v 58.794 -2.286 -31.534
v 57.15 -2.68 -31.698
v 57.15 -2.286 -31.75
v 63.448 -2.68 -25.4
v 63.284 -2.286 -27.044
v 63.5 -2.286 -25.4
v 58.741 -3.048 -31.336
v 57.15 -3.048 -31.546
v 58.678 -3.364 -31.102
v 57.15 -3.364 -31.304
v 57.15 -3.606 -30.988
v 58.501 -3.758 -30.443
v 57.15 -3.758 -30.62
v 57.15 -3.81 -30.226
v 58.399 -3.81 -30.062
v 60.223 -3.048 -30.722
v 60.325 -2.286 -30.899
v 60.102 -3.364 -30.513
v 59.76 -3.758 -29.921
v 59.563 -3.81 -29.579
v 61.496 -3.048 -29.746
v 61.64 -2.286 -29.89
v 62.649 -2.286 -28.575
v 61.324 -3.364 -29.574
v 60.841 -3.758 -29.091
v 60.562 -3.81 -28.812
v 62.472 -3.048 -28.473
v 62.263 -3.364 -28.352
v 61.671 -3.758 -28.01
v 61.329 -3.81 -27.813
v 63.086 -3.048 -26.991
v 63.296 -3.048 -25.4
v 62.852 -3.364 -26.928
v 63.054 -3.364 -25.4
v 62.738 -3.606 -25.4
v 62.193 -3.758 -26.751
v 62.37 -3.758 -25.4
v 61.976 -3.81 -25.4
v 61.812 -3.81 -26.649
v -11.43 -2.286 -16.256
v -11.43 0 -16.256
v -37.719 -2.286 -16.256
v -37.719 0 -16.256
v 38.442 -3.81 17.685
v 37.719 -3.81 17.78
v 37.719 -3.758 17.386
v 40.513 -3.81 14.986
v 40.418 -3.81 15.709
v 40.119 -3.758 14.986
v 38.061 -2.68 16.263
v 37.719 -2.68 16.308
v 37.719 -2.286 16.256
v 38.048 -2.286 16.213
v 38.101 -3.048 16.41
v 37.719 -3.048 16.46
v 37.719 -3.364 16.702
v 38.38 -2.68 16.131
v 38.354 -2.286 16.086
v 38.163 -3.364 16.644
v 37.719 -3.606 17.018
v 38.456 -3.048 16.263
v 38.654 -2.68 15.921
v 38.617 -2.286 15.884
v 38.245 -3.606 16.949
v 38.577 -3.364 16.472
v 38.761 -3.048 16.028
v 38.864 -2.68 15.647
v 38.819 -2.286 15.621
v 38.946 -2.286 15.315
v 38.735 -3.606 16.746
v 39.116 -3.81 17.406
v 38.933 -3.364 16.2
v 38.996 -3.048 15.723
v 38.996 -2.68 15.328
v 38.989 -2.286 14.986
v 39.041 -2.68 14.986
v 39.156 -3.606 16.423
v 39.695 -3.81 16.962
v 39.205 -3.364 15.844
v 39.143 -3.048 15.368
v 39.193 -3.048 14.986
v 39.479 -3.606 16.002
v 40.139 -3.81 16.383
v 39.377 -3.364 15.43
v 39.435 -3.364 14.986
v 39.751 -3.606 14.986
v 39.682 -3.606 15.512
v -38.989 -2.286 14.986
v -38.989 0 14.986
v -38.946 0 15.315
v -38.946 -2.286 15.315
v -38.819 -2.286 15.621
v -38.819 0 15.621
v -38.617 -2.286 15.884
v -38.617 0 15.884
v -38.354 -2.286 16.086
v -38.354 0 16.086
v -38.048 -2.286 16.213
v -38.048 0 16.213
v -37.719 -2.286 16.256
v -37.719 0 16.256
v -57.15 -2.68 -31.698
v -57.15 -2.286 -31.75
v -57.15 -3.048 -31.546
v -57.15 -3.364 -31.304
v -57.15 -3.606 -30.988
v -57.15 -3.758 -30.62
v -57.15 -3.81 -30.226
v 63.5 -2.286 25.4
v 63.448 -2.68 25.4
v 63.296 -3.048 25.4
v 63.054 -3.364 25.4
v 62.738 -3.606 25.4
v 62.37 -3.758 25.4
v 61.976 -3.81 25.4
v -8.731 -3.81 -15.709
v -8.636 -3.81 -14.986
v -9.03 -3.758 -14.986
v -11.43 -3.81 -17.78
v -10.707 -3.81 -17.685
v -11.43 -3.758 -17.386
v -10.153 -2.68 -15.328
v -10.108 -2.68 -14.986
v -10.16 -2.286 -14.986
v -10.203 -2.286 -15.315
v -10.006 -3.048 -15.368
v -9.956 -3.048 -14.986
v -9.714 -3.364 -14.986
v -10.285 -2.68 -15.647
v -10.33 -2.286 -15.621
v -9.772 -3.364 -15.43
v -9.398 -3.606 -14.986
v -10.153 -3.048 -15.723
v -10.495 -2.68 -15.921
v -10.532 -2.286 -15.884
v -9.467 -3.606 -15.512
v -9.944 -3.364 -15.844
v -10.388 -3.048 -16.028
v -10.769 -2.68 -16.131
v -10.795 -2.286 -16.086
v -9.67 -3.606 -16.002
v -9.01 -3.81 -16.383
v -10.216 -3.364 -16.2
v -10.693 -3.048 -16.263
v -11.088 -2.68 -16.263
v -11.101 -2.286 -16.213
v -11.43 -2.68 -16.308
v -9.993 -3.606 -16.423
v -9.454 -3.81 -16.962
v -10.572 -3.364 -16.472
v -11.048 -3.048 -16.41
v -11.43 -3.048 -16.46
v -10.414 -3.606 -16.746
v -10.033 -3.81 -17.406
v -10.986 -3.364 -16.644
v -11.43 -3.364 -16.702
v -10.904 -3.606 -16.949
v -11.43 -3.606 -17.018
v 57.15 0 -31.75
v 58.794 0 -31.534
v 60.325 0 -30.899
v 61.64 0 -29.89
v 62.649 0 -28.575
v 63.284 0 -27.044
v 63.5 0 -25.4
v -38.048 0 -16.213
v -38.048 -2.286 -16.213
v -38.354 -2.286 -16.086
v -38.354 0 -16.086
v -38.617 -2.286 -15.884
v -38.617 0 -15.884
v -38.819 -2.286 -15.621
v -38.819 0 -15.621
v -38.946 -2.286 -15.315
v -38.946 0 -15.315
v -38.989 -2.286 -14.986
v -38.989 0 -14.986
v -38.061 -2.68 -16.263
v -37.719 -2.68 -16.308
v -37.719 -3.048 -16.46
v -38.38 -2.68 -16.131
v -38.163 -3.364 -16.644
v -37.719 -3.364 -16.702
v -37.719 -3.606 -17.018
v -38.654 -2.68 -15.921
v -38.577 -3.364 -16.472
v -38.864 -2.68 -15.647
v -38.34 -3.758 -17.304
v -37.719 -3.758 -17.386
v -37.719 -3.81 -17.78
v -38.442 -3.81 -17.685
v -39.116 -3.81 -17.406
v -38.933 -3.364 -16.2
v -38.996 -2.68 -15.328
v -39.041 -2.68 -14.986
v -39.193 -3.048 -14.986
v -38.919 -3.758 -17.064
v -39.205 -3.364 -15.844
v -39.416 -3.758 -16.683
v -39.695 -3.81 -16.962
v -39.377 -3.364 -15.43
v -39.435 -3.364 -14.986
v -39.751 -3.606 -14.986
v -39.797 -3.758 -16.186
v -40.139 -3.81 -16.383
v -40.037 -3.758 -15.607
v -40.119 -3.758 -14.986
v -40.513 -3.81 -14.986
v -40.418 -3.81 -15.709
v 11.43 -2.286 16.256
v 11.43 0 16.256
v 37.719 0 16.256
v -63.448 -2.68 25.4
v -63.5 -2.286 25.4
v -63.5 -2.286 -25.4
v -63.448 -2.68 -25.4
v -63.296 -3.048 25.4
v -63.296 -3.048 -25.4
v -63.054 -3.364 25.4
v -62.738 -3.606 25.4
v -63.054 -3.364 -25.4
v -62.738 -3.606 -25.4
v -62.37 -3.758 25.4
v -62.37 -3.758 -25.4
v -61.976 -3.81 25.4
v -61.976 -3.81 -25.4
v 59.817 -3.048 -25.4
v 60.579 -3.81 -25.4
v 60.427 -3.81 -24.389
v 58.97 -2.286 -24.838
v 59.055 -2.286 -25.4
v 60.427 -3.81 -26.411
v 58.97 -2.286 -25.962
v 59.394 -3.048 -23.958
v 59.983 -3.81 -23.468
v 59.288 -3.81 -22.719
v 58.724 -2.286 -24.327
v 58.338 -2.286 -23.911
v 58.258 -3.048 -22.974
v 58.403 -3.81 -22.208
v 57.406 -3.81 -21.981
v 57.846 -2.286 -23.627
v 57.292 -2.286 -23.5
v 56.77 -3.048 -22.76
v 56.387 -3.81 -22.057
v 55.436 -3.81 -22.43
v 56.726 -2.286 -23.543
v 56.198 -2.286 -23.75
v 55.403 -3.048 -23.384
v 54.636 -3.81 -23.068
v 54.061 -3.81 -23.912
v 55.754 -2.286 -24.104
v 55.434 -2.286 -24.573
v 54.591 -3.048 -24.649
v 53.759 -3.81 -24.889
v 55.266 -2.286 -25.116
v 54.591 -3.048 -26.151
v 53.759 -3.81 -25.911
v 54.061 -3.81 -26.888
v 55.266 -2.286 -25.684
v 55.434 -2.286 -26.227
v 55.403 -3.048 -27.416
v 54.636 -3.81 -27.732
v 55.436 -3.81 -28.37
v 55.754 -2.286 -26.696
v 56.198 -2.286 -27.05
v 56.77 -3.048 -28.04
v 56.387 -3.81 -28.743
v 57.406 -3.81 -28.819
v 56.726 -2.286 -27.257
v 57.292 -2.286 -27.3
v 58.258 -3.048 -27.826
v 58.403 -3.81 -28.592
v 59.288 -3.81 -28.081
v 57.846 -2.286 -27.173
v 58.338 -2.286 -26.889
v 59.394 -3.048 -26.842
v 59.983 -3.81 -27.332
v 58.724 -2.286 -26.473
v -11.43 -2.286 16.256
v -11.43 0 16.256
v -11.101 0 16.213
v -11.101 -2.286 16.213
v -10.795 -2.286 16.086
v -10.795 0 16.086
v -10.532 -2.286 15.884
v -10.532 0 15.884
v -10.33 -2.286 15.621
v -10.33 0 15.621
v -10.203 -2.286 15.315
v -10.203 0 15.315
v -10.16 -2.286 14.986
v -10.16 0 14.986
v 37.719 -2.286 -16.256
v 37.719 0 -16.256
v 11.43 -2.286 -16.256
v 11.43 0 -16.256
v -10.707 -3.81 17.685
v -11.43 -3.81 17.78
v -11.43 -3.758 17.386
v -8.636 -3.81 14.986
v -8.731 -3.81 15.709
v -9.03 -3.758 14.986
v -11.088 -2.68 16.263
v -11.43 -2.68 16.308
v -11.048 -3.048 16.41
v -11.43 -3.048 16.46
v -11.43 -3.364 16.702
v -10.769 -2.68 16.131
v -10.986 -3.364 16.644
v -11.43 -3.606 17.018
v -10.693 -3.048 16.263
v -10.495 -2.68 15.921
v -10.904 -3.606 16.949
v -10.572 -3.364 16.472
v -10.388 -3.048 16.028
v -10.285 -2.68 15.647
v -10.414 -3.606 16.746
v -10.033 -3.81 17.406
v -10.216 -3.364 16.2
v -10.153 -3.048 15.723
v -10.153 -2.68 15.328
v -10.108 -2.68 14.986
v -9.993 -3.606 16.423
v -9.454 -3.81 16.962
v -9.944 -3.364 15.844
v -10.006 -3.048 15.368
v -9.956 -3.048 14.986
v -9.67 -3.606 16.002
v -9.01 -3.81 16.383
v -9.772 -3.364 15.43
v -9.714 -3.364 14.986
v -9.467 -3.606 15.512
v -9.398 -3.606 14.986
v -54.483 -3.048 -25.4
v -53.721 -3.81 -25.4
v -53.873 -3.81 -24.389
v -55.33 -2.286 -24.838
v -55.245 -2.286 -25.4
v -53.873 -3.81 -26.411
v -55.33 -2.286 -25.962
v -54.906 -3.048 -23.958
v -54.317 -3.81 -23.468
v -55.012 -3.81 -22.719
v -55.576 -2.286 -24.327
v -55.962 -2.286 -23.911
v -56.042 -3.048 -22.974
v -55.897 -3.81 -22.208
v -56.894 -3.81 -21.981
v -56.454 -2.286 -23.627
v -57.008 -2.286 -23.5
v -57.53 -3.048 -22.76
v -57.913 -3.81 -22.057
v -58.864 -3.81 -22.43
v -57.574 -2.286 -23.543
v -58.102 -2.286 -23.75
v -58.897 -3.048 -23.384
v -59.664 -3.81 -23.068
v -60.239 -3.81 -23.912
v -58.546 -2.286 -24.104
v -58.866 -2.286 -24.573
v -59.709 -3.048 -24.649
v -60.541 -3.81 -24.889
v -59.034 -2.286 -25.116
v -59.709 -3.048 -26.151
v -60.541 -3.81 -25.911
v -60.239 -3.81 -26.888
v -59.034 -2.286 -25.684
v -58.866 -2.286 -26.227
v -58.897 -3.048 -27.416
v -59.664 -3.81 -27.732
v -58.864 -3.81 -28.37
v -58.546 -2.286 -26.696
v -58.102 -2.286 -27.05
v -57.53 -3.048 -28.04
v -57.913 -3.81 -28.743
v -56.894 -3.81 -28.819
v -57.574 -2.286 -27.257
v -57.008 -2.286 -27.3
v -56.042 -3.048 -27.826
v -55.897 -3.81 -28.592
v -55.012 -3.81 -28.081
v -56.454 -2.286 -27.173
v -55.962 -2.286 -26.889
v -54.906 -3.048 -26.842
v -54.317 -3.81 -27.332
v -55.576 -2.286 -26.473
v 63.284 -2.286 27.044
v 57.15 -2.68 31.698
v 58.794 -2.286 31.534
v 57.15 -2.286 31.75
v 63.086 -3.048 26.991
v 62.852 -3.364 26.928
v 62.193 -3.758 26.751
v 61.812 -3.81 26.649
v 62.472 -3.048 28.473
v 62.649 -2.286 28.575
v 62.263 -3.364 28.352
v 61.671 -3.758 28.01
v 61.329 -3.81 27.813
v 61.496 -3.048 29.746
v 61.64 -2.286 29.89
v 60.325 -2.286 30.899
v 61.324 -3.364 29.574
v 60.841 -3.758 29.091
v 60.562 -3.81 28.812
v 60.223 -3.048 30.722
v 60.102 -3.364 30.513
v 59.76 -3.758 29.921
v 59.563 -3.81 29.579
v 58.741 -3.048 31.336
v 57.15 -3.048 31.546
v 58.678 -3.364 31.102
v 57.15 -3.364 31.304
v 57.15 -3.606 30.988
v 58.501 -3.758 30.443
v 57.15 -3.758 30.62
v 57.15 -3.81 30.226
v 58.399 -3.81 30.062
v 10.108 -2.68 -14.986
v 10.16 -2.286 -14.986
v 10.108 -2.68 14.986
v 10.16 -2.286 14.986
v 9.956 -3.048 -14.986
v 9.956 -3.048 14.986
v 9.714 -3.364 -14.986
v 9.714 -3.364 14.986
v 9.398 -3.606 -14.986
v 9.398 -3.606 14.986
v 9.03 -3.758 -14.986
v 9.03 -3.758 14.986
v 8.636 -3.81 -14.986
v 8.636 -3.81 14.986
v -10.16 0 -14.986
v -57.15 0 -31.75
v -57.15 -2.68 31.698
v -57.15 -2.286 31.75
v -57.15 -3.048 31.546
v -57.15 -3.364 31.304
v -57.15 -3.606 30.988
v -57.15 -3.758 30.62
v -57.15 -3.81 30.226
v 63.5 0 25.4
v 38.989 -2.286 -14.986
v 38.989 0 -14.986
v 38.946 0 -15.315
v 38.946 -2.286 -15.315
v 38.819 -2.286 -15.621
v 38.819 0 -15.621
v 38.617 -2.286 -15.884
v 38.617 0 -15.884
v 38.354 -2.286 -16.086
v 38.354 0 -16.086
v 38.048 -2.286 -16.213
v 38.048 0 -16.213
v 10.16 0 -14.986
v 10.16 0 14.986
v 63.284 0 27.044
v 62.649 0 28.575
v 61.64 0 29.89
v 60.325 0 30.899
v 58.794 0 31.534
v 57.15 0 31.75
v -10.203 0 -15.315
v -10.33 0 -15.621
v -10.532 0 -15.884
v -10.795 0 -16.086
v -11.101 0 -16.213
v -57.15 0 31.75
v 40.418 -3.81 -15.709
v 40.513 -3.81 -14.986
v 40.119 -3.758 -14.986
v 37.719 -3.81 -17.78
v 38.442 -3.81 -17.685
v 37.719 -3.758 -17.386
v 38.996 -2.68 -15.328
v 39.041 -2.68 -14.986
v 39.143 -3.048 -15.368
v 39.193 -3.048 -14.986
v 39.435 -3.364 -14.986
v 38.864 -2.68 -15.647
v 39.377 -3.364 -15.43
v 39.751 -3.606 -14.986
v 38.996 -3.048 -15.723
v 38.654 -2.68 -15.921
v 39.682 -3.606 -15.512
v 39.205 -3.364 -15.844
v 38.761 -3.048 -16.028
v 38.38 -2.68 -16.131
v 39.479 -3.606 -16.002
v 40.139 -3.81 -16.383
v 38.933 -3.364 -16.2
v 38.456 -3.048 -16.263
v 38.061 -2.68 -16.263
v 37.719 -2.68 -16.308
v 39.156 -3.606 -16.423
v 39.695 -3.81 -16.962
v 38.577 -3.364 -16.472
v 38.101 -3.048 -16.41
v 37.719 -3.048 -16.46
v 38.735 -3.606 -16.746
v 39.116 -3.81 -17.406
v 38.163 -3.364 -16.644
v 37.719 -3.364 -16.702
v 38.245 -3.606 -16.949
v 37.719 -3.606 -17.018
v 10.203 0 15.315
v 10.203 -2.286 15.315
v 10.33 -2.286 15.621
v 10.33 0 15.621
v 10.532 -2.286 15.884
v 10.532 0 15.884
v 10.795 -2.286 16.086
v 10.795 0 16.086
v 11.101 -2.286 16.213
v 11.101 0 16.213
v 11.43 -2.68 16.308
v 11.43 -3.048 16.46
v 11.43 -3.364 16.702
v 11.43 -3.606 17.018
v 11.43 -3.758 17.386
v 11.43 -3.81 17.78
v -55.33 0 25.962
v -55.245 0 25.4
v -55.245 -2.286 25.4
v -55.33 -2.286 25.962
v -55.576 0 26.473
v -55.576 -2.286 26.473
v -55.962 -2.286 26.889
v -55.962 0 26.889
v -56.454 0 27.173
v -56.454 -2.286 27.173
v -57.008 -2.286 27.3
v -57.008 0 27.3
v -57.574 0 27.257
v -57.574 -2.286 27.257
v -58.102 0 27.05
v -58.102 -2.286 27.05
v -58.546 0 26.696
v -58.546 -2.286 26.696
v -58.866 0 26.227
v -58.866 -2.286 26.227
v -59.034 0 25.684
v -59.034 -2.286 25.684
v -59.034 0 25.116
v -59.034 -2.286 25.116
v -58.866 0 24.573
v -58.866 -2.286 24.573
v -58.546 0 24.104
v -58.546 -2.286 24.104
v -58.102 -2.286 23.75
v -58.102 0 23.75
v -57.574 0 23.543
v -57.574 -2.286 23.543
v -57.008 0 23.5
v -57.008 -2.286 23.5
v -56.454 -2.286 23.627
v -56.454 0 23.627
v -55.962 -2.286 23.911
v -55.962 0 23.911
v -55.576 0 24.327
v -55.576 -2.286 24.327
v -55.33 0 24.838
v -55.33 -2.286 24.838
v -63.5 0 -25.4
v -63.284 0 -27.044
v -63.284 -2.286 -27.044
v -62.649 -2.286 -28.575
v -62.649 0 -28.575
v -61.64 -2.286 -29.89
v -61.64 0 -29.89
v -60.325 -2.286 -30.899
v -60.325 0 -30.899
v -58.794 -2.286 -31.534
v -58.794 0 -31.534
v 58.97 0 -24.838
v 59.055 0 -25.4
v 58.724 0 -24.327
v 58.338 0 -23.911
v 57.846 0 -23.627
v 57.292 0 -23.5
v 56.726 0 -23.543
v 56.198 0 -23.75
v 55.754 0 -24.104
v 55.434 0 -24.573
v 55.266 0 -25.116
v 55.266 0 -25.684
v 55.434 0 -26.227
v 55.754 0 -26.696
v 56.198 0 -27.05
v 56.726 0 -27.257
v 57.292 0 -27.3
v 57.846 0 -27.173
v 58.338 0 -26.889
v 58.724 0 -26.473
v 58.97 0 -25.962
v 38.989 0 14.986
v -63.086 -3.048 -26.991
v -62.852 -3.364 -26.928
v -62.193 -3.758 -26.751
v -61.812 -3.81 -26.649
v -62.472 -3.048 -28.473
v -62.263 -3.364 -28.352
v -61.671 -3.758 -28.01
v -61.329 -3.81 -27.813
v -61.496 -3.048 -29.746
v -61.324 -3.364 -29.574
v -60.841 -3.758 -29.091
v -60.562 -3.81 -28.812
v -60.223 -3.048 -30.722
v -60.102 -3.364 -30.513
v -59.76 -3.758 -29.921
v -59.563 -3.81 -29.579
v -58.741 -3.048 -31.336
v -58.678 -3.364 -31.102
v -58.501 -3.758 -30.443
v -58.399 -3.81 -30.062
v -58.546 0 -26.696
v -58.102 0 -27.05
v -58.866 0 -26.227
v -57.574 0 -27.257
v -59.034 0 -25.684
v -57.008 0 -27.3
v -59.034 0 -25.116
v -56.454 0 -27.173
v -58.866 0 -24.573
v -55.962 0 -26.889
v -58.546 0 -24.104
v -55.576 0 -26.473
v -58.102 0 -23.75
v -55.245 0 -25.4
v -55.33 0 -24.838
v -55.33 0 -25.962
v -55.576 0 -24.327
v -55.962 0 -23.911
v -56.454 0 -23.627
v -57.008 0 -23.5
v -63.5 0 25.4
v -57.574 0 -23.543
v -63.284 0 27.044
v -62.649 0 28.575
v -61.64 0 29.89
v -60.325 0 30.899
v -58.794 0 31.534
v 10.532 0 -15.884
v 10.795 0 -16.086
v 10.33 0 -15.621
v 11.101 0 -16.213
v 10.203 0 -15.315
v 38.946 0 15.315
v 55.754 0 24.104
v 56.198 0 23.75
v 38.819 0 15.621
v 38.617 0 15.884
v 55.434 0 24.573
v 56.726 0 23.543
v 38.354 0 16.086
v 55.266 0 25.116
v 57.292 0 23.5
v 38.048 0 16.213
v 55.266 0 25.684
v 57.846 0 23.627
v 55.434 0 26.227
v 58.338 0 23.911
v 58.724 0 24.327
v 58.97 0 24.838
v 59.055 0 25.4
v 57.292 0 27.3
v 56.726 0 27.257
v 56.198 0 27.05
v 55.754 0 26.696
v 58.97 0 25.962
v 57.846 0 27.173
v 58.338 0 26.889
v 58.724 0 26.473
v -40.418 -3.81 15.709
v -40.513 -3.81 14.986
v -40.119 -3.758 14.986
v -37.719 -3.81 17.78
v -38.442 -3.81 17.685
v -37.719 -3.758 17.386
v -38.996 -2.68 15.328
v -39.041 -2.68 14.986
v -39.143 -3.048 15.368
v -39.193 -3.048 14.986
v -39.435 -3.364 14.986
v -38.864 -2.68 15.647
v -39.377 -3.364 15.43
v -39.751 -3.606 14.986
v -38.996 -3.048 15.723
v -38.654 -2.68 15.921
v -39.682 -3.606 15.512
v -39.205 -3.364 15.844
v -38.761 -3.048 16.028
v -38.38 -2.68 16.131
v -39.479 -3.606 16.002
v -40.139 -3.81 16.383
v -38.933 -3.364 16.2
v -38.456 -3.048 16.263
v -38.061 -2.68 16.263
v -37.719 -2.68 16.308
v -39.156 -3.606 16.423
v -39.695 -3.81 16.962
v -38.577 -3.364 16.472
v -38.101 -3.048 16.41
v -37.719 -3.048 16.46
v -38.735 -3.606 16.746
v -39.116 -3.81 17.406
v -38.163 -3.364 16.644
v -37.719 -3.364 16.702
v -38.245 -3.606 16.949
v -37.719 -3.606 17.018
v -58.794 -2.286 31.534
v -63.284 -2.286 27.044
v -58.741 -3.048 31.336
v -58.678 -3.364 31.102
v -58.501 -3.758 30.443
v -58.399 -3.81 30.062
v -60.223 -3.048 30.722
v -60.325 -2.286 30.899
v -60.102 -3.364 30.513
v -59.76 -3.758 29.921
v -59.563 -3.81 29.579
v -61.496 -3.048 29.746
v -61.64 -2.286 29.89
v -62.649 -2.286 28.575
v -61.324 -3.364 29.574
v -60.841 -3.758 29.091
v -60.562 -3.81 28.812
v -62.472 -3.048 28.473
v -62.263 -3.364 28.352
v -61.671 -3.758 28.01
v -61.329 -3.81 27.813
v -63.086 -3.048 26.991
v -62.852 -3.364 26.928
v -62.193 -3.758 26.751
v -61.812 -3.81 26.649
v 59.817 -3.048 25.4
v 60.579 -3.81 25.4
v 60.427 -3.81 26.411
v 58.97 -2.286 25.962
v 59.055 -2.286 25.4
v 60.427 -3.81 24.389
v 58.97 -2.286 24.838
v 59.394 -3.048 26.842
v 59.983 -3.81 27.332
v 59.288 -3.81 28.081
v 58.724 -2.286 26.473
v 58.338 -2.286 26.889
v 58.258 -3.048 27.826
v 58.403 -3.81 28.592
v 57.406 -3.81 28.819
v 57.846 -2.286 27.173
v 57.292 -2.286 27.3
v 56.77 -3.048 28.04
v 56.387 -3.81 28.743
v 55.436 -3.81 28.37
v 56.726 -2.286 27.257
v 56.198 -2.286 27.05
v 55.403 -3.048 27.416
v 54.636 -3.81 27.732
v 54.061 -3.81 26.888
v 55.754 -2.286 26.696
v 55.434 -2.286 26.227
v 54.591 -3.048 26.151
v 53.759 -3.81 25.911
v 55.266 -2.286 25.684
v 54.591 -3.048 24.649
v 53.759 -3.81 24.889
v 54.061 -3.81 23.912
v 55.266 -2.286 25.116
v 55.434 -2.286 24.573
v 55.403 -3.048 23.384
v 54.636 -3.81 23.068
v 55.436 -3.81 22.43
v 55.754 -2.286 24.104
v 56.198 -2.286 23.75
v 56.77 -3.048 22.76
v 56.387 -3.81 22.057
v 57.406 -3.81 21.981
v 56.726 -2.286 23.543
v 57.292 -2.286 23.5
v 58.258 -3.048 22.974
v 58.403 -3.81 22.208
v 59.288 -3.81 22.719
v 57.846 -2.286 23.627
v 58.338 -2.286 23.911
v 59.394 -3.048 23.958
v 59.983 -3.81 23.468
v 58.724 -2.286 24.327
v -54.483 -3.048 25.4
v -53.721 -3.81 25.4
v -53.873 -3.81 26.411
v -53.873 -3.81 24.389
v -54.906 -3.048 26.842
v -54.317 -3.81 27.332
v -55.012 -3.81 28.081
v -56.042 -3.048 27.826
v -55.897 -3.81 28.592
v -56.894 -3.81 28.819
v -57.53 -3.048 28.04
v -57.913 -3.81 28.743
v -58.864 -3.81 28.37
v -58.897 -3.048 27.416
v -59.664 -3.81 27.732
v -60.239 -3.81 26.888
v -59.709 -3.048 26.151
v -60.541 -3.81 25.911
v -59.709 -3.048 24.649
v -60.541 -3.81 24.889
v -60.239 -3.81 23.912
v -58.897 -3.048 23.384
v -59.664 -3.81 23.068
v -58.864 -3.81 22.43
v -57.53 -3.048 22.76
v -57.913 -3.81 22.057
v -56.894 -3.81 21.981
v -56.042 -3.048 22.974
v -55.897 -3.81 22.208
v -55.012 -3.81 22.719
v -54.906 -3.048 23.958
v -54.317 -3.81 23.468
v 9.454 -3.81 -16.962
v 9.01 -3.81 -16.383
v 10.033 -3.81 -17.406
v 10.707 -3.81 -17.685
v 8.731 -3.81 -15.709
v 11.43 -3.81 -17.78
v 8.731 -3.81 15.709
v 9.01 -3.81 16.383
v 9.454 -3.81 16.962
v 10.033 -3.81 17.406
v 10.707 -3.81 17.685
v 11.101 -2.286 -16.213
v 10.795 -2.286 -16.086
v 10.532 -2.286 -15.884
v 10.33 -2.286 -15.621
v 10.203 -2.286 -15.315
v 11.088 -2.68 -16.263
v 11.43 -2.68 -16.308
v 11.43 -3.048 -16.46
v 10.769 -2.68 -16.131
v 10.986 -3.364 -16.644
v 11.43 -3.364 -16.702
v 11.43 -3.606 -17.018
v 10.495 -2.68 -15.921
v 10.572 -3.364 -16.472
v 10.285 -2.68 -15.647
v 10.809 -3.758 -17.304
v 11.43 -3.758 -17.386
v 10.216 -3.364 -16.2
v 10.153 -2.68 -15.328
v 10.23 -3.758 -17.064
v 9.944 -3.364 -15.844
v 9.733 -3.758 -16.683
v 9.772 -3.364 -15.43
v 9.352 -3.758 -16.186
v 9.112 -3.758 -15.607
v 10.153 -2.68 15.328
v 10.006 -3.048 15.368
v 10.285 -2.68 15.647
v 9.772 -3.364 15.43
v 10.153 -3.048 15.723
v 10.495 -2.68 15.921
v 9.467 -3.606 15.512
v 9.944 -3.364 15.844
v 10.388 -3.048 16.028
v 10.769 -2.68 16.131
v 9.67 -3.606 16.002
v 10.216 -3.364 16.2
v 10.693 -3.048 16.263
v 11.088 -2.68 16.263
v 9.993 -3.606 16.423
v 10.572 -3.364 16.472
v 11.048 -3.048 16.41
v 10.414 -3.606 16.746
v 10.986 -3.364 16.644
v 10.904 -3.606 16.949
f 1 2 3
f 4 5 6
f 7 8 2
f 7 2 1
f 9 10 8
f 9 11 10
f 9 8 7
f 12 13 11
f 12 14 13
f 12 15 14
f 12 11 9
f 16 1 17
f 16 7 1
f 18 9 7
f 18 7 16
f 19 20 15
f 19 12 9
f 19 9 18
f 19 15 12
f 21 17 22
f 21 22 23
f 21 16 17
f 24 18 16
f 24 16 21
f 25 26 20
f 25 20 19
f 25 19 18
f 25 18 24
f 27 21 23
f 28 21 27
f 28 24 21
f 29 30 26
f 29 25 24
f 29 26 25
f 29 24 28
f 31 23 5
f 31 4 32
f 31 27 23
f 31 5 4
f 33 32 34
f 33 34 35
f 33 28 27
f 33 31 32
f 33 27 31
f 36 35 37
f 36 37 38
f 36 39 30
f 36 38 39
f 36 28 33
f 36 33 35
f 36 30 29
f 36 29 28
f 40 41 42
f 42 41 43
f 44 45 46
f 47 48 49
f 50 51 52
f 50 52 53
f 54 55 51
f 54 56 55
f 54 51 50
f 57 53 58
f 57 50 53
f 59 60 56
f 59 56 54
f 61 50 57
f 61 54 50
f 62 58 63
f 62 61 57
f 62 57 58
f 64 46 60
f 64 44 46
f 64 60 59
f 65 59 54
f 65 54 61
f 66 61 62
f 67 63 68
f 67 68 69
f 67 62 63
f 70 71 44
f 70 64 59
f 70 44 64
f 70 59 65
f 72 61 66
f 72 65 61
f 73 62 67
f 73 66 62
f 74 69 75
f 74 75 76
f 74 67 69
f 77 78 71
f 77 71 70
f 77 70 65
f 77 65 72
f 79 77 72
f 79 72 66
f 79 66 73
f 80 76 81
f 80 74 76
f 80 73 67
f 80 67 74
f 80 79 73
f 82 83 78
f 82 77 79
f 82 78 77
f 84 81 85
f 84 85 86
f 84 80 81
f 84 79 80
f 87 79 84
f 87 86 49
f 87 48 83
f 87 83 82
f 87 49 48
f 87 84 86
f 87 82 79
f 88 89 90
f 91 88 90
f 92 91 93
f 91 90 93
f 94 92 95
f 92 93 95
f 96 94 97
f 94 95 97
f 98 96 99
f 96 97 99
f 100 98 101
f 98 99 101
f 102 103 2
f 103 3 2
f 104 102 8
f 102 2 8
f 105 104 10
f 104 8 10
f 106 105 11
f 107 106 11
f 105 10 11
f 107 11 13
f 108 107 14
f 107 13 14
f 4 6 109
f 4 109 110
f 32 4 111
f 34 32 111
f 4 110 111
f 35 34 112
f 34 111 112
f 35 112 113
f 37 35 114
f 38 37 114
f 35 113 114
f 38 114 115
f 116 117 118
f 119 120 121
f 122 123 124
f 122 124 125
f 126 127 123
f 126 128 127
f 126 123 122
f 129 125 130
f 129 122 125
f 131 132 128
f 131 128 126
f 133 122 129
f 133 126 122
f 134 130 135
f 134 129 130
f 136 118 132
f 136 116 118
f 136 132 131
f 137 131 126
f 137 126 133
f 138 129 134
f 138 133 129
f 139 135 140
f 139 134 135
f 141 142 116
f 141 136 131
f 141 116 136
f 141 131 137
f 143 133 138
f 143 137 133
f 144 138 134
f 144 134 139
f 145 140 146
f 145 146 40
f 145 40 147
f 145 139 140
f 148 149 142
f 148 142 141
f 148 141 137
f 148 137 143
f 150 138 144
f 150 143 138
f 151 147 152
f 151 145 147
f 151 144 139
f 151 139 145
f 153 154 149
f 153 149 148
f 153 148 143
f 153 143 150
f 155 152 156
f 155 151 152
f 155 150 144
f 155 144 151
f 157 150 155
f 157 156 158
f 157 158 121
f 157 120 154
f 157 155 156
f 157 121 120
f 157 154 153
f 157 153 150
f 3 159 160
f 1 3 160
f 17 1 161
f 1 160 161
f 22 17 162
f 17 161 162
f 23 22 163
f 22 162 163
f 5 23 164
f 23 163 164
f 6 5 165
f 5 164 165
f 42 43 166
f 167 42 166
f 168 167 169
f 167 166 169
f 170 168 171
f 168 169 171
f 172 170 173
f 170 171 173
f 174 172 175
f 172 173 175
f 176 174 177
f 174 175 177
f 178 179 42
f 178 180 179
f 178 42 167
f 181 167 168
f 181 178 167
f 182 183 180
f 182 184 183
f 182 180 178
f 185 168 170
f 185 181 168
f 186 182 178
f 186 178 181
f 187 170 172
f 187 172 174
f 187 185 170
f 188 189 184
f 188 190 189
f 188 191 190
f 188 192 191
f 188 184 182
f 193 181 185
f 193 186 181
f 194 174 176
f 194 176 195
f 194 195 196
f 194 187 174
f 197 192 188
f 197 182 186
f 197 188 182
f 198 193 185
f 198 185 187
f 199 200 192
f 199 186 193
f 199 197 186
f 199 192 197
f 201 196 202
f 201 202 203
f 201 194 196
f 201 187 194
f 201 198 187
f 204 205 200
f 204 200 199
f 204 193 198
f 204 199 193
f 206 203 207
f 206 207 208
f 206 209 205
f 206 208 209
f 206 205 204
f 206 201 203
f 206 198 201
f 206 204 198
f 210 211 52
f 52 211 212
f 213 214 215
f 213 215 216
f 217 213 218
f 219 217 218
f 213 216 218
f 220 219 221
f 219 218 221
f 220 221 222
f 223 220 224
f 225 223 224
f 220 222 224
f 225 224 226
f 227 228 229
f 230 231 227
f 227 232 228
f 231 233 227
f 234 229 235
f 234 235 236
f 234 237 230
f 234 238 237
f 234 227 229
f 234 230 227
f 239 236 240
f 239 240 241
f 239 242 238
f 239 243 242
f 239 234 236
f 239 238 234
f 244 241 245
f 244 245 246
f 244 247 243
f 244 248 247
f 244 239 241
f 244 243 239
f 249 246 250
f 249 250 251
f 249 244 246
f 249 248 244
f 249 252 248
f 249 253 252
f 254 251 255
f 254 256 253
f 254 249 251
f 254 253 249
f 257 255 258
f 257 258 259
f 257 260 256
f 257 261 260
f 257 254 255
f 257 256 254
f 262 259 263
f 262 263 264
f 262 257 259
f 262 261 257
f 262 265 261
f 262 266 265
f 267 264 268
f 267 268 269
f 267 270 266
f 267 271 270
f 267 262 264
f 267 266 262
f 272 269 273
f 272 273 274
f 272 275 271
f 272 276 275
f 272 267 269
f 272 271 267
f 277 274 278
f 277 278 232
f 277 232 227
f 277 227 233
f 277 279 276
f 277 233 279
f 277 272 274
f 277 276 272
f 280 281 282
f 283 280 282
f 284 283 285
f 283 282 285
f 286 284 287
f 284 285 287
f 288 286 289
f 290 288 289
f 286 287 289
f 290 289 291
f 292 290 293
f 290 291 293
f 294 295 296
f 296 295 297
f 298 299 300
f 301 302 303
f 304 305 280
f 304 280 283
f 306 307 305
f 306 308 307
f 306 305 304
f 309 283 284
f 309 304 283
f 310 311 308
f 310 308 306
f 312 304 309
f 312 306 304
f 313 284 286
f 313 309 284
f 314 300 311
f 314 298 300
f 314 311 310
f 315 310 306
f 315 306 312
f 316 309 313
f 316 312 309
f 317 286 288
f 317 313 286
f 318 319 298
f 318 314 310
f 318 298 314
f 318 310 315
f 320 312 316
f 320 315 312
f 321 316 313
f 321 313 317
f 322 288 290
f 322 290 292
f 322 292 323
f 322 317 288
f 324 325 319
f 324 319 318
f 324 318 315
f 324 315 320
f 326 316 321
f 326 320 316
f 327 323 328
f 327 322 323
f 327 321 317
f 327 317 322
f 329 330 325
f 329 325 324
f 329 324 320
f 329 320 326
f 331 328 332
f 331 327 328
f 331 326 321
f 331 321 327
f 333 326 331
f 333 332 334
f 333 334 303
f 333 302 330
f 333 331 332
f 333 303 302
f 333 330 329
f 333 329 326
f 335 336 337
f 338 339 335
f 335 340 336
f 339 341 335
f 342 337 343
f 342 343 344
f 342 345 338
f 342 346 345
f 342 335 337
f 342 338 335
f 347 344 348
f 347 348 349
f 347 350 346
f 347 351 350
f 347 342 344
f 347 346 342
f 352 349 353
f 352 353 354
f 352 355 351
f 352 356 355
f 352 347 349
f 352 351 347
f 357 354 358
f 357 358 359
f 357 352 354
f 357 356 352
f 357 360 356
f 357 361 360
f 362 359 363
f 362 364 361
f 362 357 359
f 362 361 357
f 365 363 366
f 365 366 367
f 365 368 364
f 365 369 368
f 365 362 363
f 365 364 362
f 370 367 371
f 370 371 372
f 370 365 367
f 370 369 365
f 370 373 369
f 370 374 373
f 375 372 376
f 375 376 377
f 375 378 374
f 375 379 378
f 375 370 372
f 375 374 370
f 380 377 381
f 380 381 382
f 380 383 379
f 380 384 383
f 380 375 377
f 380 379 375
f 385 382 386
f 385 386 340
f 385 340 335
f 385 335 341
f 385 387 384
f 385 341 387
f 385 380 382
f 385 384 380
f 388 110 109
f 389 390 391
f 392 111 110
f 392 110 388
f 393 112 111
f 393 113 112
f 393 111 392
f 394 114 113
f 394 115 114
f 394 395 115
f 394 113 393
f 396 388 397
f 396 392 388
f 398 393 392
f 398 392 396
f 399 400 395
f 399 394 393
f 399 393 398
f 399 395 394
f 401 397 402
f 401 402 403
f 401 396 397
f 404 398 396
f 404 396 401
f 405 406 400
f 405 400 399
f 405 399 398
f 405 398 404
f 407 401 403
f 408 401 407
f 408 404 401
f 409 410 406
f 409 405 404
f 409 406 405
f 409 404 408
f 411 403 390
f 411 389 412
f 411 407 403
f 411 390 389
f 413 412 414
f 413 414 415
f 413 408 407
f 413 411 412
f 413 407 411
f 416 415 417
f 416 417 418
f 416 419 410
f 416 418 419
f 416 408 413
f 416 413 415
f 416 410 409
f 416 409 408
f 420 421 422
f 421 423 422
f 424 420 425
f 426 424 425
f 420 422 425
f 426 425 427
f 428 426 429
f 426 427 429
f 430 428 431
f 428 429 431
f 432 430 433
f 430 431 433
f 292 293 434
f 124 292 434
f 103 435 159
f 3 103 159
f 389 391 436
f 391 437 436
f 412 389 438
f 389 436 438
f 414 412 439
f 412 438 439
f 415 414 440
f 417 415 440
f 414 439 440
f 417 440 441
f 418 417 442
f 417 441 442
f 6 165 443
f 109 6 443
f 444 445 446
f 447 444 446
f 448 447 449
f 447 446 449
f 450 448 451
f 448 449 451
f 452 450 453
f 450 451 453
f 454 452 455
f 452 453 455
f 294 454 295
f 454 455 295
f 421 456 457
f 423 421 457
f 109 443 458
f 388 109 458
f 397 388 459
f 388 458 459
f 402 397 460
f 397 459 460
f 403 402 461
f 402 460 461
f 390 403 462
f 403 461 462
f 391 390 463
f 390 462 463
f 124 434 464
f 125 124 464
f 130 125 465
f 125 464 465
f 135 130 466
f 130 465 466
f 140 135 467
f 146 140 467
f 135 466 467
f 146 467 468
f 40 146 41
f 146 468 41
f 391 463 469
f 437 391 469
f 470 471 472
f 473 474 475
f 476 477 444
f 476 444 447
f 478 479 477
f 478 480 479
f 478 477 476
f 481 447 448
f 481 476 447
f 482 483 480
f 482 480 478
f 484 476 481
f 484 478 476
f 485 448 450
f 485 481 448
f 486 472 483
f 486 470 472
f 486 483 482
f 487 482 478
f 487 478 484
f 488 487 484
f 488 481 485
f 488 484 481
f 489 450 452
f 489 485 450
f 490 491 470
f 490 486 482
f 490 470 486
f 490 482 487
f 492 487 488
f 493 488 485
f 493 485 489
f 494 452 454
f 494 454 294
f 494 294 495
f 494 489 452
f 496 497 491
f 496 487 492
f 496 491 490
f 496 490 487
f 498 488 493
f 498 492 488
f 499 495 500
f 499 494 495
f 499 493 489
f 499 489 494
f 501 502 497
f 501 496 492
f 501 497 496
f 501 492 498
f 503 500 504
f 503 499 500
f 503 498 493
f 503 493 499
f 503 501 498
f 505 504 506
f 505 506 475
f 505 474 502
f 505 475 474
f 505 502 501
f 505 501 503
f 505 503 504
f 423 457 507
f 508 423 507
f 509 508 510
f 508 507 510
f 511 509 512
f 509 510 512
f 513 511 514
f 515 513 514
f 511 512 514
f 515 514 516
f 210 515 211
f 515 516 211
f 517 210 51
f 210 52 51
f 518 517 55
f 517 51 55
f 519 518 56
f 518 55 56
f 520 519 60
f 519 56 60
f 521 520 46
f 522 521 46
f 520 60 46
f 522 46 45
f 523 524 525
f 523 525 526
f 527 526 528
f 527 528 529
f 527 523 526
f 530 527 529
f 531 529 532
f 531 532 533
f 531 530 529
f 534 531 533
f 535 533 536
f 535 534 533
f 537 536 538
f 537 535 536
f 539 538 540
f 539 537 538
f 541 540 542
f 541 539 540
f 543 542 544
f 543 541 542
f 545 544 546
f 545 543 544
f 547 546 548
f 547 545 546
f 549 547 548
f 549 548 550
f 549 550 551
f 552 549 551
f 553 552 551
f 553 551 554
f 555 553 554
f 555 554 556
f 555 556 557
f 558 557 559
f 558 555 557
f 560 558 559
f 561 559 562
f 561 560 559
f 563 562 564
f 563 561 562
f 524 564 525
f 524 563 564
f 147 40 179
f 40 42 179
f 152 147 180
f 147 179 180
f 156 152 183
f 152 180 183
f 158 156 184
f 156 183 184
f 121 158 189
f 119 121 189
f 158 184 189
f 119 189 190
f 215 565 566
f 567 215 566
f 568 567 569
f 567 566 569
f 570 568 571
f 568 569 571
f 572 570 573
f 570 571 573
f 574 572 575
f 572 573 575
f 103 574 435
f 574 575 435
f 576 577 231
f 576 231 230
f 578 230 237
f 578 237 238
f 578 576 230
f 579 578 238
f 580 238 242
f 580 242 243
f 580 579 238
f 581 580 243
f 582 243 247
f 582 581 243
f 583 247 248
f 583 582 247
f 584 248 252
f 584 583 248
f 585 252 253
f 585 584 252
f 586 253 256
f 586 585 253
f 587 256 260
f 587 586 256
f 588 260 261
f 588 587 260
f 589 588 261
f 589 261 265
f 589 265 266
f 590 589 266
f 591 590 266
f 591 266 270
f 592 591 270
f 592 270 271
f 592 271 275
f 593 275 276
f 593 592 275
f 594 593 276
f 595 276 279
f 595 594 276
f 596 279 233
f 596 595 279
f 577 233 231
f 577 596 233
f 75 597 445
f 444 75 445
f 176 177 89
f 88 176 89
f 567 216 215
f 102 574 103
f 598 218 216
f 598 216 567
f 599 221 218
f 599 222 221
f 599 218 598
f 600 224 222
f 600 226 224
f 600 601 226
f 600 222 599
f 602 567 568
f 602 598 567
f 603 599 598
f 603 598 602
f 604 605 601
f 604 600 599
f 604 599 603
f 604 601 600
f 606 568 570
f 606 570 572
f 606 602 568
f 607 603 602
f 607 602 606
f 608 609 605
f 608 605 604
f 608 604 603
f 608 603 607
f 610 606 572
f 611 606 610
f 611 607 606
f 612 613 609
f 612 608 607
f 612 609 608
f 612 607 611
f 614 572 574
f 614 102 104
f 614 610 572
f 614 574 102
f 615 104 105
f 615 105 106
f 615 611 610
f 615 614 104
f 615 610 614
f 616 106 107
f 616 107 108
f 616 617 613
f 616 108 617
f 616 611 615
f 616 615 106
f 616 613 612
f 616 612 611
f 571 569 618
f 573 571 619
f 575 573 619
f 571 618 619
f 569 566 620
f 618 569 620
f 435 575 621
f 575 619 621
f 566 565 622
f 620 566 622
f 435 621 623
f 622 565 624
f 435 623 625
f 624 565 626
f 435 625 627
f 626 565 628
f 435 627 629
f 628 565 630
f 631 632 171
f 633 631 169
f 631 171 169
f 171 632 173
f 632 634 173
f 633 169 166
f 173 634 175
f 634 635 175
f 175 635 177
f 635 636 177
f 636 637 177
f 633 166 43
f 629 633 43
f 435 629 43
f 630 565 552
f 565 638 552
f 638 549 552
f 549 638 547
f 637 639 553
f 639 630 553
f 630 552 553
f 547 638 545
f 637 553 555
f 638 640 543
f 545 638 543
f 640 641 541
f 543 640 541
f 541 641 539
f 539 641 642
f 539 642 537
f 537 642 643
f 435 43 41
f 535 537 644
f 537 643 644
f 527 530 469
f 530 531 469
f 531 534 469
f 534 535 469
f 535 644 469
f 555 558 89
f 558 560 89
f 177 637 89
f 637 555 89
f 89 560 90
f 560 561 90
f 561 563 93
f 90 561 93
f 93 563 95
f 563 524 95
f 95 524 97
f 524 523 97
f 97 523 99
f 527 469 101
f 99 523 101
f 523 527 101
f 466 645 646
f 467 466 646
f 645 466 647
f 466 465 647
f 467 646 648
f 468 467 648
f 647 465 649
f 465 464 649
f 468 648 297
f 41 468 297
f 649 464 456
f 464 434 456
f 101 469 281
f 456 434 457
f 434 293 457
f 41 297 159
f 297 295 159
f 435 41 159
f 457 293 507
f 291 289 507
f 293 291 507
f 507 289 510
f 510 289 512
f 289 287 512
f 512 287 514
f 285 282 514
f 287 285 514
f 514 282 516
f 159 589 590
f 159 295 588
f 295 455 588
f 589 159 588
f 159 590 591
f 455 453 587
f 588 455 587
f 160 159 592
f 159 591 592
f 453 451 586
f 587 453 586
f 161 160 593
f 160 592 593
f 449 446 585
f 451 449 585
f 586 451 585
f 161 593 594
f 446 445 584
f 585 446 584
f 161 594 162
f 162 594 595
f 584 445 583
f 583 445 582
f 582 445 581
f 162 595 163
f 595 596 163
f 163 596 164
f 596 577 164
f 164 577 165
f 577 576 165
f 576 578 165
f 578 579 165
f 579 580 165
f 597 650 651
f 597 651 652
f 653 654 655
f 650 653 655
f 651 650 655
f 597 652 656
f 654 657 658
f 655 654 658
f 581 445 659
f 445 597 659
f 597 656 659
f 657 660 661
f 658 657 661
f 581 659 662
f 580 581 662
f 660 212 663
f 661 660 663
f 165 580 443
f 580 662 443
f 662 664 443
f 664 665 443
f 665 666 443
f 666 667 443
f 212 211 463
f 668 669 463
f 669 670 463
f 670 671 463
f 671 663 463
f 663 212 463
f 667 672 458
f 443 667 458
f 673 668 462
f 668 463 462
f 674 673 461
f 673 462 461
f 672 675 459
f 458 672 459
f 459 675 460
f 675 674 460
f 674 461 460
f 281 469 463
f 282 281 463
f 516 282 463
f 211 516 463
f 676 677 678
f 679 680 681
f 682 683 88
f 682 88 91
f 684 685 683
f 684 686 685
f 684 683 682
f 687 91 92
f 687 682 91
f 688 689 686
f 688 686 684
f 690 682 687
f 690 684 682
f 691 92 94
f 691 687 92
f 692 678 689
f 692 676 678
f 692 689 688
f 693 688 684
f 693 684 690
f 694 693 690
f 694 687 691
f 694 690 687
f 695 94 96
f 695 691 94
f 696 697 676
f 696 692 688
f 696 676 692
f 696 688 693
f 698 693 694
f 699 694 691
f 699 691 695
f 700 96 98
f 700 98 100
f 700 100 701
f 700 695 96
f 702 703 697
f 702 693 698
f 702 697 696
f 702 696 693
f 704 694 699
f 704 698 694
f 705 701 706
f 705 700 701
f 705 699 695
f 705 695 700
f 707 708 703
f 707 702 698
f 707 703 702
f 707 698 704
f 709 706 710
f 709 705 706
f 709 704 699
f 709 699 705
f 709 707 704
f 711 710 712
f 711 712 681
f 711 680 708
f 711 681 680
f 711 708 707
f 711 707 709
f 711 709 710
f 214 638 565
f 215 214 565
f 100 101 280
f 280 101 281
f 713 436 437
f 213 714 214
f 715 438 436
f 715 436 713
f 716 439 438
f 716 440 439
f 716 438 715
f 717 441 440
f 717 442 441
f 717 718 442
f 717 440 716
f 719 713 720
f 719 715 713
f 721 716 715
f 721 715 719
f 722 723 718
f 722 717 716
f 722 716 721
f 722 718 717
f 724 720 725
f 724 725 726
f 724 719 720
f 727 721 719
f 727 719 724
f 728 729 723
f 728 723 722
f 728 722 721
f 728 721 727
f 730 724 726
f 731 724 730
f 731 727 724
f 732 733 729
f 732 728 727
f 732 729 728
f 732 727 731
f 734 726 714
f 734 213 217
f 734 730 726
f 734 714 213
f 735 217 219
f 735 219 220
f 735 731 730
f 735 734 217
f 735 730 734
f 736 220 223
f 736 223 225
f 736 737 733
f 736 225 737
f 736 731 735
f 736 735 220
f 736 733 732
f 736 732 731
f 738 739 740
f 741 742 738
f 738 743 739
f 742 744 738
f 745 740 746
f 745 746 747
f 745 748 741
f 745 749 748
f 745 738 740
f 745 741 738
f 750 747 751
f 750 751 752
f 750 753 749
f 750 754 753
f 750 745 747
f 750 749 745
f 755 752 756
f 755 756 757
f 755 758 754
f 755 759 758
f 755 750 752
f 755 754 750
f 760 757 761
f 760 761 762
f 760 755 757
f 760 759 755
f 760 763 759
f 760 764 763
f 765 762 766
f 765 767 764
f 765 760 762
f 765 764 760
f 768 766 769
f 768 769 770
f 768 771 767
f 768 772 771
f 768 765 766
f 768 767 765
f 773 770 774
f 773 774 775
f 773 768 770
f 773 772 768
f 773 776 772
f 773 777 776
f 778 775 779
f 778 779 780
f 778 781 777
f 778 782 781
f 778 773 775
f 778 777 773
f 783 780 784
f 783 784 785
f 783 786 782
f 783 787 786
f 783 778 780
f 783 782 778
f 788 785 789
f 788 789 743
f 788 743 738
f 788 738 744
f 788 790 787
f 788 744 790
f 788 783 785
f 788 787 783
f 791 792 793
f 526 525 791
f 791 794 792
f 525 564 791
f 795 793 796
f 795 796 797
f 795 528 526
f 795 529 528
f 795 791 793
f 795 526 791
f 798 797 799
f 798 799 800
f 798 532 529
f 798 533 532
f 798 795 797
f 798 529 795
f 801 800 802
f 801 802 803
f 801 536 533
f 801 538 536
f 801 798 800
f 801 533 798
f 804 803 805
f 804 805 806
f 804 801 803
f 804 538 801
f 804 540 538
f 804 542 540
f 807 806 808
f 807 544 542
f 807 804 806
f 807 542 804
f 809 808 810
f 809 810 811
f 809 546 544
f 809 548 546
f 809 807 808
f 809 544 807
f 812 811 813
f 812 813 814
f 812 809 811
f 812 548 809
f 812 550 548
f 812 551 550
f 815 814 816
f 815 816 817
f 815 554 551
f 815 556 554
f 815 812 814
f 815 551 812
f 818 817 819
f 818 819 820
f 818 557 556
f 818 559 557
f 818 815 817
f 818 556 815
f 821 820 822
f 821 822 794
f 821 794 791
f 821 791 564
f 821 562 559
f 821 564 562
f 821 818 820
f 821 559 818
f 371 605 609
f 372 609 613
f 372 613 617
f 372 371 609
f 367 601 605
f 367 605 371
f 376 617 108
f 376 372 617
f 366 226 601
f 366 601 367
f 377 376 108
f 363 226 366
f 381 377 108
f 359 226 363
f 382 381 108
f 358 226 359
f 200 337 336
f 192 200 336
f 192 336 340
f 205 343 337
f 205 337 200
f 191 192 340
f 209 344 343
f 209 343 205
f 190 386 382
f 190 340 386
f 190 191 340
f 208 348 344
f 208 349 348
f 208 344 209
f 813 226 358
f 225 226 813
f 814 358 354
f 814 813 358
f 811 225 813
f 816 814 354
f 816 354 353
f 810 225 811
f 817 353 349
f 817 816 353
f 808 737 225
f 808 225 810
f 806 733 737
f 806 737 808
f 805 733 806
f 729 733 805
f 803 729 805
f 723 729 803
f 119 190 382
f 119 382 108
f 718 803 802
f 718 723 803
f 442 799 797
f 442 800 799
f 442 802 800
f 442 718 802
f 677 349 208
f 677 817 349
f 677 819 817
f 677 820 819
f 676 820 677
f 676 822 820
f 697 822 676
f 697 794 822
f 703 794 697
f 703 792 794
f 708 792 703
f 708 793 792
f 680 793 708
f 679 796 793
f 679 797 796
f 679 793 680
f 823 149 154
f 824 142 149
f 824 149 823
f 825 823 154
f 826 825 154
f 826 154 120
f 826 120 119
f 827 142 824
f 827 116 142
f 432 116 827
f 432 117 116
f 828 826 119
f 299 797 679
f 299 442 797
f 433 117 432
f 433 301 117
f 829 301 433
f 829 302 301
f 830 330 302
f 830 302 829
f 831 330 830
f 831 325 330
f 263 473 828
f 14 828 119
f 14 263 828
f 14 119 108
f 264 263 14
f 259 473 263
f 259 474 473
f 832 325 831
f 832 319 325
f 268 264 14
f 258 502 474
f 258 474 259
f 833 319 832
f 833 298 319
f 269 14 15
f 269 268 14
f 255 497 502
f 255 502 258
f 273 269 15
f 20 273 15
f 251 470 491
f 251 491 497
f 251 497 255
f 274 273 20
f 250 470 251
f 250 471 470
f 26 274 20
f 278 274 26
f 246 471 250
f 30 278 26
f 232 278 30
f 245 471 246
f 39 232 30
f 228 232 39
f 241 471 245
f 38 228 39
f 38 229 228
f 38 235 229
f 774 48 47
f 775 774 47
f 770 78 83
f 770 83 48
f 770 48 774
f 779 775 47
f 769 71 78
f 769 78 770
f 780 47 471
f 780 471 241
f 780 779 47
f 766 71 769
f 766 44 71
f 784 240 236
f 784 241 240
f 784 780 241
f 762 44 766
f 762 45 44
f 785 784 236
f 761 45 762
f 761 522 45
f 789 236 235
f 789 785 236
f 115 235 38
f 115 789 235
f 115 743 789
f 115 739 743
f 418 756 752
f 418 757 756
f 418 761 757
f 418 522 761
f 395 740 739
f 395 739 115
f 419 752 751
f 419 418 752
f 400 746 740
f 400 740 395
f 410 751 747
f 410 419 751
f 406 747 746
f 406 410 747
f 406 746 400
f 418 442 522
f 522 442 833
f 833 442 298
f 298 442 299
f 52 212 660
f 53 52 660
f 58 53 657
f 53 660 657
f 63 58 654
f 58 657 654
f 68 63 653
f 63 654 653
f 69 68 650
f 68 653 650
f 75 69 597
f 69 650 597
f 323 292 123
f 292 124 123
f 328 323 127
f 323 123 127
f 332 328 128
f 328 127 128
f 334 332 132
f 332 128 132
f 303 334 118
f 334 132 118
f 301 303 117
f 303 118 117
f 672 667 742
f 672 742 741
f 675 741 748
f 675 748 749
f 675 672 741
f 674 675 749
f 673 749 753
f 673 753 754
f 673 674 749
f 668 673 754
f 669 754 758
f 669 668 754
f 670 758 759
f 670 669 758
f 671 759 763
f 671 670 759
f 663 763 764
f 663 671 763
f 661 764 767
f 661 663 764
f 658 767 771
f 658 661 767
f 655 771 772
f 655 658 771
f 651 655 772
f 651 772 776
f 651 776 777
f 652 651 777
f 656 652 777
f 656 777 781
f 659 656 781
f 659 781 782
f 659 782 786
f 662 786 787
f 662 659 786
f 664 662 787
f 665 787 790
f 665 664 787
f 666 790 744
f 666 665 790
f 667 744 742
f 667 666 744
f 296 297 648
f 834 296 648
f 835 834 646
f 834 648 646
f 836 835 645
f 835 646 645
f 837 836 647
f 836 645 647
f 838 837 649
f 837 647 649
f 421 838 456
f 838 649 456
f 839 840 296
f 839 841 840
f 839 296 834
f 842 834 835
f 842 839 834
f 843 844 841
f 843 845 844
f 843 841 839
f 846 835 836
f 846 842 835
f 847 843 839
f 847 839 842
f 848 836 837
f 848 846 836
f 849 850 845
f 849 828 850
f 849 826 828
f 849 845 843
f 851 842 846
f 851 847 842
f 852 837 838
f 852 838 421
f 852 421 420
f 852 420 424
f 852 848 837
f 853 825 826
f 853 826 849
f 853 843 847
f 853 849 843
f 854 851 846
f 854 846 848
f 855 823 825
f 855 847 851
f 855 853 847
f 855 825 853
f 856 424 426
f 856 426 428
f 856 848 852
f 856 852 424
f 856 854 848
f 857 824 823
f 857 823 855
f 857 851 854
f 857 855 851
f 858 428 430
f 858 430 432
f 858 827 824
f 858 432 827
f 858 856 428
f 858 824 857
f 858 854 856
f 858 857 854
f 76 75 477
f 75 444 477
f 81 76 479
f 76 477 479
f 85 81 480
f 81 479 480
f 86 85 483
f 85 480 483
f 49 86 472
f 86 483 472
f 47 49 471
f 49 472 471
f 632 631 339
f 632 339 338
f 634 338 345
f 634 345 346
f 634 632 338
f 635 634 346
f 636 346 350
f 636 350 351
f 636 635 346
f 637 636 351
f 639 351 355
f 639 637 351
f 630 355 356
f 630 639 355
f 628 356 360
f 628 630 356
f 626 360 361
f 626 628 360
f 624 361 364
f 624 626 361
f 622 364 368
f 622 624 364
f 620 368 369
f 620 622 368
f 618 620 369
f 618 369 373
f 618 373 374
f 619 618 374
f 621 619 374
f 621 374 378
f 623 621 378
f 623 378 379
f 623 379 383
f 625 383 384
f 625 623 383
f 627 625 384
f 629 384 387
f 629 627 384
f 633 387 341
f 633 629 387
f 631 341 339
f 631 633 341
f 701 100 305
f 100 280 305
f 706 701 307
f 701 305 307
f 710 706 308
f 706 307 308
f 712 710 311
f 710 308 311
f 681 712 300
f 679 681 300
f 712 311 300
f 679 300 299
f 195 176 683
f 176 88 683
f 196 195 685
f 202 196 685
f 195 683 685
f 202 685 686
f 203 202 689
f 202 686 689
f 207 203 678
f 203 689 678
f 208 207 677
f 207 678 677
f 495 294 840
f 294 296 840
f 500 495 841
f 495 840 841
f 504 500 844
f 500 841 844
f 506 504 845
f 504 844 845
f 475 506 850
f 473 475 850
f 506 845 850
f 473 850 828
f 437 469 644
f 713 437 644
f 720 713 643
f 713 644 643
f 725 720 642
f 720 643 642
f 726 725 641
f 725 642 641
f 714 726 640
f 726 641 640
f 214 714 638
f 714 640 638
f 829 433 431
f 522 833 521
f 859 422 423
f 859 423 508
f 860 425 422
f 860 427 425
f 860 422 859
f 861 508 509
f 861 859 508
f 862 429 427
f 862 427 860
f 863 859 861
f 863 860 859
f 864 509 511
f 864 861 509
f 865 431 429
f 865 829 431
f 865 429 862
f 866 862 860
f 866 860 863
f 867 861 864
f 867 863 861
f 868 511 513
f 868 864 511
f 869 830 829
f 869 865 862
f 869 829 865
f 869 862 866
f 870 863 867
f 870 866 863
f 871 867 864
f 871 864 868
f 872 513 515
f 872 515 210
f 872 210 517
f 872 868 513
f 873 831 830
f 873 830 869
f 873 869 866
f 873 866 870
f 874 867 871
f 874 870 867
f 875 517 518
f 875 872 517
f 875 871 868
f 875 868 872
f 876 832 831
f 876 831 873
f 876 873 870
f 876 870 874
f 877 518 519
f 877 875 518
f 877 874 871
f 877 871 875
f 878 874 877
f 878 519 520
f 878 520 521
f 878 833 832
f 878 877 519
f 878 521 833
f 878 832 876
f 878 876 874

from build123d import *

# Parameters (mm, degrees)
F0_R     = 1.905
F1_DEPTH = 3.81
F2_R     = 1.524
F3_SIZE  = 1.524


with BuildPart() as f1:
    # F0 (on Front) → F1 (new body)
    with BuildSketch(Plane.XZ):
        with BuildLine():
            ThreePointArc((63.5, 25.4), (61.640128, 29.890128), (57.15, 31.75))
            Line((57.15, 31.75), (-57.15, 31.75))
            ThreePointArc((-57.15, 31.75), (-61.640128, 29.890128), (-63.5, 25.4))
            Line((-63.5, 25.4), (-63.5, -25.4))
            ThreePointArc((-63.5, -25.4), (-61.640128, -29.890128), (-57.15, -31.75))
            Line((-57.15, -31.75), (57.15, -31.75))
            ThreePointArc((57.15, -31.75), (61.640128, -29.890128), (63.5, -25.4))
            Line((63.5, -25.4), (63.5, 25.4))
        make_face()
        with Locations((-57.15, -25.4)):
            Circle(F0_R, mode=Mode.SUBTRACT)
        with Locations((57.15, -25.4)):
            Circle(F0_R, mode=Mode.SUBTRACT)
        with BuildLine():
            ThreePointArc((-38.989, 14.986), (-38.617026, 15.884026), (-37.719, 16.256))
            Line((-37.719, 16.256), (-11.43, 16.256))
            ThreePointArc((-11.43, 16.256), (-10.531974, 15.884026), (-10.16, 14.986))
            Line((-10.16, 14.986), (-10.16, -14.986))
            ThreePointArc((-10.16, -14.986), (-10.531974, -15.884026), (-11.43, -16.256))
            Line((-11.43, -16.256), (-37.719, -16.256))
            ThreePointArc((-37.719, -16.256), (-38.617026, -15.884026), (-38.989, -14.986))
            Line((-38.989, -14.986), (-38.989, 14.986))
        make_face(mode=Mode.SUBTRACT)
        with Locations((-57.15, 25.4)):
            Circle(F0_R, mode=Mode.SUBTRACT)
        with BuildLine():
            ThreePointArc((10.16, 14.986), (10.531974, 15.884026), (11.43, 16.256))
            Line((11.43, 16.256), (37.719, 16.256))
            ThreePointArc((37.719, 16.256), (38.617026, 15.884026), (38.989, 14.986))
            Line((38.989, 14.986), (38.989, -14.986))
            ThreePointArc((38.989, -14.986), (38.617026, -15.884026), (37.719, -16.256))
            Line((37.719, -16.256), (11.43, -16.256))
            ThreePointArc((11.43, -16.256), (10.531974, -15.884026), (10.16, -14.986))
            Line((10.16, -14.986), (10.16, 14.986))
        make_face(mode=Mode.SUBTRACT)
        with Locations((57.15, 25.4)):
            Circle(F0_R, mode=Mode.SUBTRACT)
    extrude(amount=F1_DEPTH)

    # F2
    f2_edges = [f1.edges().sort_by_distance(p)[0] for p in [
        (-38.989, -3.81, 0),
        (10.16, -3.81, 0),
        (-63.5, -3.81, 0),
    ]]
    fillet(f2_edges, radius=F2_R)

    # F3
    f3_edges = [f1.edges().sort_by_distance(p)[0] for p in [
        (-59.055, -3.81, 25.4),
        (-59.055, -3.81, -25.4),
        (55.245, -3.81, -25.4),
        (55.245, -3.81, 25.4),
    ]]
    chamfer(f3_edges, length=F3_SIZE)


solid = f1.part
